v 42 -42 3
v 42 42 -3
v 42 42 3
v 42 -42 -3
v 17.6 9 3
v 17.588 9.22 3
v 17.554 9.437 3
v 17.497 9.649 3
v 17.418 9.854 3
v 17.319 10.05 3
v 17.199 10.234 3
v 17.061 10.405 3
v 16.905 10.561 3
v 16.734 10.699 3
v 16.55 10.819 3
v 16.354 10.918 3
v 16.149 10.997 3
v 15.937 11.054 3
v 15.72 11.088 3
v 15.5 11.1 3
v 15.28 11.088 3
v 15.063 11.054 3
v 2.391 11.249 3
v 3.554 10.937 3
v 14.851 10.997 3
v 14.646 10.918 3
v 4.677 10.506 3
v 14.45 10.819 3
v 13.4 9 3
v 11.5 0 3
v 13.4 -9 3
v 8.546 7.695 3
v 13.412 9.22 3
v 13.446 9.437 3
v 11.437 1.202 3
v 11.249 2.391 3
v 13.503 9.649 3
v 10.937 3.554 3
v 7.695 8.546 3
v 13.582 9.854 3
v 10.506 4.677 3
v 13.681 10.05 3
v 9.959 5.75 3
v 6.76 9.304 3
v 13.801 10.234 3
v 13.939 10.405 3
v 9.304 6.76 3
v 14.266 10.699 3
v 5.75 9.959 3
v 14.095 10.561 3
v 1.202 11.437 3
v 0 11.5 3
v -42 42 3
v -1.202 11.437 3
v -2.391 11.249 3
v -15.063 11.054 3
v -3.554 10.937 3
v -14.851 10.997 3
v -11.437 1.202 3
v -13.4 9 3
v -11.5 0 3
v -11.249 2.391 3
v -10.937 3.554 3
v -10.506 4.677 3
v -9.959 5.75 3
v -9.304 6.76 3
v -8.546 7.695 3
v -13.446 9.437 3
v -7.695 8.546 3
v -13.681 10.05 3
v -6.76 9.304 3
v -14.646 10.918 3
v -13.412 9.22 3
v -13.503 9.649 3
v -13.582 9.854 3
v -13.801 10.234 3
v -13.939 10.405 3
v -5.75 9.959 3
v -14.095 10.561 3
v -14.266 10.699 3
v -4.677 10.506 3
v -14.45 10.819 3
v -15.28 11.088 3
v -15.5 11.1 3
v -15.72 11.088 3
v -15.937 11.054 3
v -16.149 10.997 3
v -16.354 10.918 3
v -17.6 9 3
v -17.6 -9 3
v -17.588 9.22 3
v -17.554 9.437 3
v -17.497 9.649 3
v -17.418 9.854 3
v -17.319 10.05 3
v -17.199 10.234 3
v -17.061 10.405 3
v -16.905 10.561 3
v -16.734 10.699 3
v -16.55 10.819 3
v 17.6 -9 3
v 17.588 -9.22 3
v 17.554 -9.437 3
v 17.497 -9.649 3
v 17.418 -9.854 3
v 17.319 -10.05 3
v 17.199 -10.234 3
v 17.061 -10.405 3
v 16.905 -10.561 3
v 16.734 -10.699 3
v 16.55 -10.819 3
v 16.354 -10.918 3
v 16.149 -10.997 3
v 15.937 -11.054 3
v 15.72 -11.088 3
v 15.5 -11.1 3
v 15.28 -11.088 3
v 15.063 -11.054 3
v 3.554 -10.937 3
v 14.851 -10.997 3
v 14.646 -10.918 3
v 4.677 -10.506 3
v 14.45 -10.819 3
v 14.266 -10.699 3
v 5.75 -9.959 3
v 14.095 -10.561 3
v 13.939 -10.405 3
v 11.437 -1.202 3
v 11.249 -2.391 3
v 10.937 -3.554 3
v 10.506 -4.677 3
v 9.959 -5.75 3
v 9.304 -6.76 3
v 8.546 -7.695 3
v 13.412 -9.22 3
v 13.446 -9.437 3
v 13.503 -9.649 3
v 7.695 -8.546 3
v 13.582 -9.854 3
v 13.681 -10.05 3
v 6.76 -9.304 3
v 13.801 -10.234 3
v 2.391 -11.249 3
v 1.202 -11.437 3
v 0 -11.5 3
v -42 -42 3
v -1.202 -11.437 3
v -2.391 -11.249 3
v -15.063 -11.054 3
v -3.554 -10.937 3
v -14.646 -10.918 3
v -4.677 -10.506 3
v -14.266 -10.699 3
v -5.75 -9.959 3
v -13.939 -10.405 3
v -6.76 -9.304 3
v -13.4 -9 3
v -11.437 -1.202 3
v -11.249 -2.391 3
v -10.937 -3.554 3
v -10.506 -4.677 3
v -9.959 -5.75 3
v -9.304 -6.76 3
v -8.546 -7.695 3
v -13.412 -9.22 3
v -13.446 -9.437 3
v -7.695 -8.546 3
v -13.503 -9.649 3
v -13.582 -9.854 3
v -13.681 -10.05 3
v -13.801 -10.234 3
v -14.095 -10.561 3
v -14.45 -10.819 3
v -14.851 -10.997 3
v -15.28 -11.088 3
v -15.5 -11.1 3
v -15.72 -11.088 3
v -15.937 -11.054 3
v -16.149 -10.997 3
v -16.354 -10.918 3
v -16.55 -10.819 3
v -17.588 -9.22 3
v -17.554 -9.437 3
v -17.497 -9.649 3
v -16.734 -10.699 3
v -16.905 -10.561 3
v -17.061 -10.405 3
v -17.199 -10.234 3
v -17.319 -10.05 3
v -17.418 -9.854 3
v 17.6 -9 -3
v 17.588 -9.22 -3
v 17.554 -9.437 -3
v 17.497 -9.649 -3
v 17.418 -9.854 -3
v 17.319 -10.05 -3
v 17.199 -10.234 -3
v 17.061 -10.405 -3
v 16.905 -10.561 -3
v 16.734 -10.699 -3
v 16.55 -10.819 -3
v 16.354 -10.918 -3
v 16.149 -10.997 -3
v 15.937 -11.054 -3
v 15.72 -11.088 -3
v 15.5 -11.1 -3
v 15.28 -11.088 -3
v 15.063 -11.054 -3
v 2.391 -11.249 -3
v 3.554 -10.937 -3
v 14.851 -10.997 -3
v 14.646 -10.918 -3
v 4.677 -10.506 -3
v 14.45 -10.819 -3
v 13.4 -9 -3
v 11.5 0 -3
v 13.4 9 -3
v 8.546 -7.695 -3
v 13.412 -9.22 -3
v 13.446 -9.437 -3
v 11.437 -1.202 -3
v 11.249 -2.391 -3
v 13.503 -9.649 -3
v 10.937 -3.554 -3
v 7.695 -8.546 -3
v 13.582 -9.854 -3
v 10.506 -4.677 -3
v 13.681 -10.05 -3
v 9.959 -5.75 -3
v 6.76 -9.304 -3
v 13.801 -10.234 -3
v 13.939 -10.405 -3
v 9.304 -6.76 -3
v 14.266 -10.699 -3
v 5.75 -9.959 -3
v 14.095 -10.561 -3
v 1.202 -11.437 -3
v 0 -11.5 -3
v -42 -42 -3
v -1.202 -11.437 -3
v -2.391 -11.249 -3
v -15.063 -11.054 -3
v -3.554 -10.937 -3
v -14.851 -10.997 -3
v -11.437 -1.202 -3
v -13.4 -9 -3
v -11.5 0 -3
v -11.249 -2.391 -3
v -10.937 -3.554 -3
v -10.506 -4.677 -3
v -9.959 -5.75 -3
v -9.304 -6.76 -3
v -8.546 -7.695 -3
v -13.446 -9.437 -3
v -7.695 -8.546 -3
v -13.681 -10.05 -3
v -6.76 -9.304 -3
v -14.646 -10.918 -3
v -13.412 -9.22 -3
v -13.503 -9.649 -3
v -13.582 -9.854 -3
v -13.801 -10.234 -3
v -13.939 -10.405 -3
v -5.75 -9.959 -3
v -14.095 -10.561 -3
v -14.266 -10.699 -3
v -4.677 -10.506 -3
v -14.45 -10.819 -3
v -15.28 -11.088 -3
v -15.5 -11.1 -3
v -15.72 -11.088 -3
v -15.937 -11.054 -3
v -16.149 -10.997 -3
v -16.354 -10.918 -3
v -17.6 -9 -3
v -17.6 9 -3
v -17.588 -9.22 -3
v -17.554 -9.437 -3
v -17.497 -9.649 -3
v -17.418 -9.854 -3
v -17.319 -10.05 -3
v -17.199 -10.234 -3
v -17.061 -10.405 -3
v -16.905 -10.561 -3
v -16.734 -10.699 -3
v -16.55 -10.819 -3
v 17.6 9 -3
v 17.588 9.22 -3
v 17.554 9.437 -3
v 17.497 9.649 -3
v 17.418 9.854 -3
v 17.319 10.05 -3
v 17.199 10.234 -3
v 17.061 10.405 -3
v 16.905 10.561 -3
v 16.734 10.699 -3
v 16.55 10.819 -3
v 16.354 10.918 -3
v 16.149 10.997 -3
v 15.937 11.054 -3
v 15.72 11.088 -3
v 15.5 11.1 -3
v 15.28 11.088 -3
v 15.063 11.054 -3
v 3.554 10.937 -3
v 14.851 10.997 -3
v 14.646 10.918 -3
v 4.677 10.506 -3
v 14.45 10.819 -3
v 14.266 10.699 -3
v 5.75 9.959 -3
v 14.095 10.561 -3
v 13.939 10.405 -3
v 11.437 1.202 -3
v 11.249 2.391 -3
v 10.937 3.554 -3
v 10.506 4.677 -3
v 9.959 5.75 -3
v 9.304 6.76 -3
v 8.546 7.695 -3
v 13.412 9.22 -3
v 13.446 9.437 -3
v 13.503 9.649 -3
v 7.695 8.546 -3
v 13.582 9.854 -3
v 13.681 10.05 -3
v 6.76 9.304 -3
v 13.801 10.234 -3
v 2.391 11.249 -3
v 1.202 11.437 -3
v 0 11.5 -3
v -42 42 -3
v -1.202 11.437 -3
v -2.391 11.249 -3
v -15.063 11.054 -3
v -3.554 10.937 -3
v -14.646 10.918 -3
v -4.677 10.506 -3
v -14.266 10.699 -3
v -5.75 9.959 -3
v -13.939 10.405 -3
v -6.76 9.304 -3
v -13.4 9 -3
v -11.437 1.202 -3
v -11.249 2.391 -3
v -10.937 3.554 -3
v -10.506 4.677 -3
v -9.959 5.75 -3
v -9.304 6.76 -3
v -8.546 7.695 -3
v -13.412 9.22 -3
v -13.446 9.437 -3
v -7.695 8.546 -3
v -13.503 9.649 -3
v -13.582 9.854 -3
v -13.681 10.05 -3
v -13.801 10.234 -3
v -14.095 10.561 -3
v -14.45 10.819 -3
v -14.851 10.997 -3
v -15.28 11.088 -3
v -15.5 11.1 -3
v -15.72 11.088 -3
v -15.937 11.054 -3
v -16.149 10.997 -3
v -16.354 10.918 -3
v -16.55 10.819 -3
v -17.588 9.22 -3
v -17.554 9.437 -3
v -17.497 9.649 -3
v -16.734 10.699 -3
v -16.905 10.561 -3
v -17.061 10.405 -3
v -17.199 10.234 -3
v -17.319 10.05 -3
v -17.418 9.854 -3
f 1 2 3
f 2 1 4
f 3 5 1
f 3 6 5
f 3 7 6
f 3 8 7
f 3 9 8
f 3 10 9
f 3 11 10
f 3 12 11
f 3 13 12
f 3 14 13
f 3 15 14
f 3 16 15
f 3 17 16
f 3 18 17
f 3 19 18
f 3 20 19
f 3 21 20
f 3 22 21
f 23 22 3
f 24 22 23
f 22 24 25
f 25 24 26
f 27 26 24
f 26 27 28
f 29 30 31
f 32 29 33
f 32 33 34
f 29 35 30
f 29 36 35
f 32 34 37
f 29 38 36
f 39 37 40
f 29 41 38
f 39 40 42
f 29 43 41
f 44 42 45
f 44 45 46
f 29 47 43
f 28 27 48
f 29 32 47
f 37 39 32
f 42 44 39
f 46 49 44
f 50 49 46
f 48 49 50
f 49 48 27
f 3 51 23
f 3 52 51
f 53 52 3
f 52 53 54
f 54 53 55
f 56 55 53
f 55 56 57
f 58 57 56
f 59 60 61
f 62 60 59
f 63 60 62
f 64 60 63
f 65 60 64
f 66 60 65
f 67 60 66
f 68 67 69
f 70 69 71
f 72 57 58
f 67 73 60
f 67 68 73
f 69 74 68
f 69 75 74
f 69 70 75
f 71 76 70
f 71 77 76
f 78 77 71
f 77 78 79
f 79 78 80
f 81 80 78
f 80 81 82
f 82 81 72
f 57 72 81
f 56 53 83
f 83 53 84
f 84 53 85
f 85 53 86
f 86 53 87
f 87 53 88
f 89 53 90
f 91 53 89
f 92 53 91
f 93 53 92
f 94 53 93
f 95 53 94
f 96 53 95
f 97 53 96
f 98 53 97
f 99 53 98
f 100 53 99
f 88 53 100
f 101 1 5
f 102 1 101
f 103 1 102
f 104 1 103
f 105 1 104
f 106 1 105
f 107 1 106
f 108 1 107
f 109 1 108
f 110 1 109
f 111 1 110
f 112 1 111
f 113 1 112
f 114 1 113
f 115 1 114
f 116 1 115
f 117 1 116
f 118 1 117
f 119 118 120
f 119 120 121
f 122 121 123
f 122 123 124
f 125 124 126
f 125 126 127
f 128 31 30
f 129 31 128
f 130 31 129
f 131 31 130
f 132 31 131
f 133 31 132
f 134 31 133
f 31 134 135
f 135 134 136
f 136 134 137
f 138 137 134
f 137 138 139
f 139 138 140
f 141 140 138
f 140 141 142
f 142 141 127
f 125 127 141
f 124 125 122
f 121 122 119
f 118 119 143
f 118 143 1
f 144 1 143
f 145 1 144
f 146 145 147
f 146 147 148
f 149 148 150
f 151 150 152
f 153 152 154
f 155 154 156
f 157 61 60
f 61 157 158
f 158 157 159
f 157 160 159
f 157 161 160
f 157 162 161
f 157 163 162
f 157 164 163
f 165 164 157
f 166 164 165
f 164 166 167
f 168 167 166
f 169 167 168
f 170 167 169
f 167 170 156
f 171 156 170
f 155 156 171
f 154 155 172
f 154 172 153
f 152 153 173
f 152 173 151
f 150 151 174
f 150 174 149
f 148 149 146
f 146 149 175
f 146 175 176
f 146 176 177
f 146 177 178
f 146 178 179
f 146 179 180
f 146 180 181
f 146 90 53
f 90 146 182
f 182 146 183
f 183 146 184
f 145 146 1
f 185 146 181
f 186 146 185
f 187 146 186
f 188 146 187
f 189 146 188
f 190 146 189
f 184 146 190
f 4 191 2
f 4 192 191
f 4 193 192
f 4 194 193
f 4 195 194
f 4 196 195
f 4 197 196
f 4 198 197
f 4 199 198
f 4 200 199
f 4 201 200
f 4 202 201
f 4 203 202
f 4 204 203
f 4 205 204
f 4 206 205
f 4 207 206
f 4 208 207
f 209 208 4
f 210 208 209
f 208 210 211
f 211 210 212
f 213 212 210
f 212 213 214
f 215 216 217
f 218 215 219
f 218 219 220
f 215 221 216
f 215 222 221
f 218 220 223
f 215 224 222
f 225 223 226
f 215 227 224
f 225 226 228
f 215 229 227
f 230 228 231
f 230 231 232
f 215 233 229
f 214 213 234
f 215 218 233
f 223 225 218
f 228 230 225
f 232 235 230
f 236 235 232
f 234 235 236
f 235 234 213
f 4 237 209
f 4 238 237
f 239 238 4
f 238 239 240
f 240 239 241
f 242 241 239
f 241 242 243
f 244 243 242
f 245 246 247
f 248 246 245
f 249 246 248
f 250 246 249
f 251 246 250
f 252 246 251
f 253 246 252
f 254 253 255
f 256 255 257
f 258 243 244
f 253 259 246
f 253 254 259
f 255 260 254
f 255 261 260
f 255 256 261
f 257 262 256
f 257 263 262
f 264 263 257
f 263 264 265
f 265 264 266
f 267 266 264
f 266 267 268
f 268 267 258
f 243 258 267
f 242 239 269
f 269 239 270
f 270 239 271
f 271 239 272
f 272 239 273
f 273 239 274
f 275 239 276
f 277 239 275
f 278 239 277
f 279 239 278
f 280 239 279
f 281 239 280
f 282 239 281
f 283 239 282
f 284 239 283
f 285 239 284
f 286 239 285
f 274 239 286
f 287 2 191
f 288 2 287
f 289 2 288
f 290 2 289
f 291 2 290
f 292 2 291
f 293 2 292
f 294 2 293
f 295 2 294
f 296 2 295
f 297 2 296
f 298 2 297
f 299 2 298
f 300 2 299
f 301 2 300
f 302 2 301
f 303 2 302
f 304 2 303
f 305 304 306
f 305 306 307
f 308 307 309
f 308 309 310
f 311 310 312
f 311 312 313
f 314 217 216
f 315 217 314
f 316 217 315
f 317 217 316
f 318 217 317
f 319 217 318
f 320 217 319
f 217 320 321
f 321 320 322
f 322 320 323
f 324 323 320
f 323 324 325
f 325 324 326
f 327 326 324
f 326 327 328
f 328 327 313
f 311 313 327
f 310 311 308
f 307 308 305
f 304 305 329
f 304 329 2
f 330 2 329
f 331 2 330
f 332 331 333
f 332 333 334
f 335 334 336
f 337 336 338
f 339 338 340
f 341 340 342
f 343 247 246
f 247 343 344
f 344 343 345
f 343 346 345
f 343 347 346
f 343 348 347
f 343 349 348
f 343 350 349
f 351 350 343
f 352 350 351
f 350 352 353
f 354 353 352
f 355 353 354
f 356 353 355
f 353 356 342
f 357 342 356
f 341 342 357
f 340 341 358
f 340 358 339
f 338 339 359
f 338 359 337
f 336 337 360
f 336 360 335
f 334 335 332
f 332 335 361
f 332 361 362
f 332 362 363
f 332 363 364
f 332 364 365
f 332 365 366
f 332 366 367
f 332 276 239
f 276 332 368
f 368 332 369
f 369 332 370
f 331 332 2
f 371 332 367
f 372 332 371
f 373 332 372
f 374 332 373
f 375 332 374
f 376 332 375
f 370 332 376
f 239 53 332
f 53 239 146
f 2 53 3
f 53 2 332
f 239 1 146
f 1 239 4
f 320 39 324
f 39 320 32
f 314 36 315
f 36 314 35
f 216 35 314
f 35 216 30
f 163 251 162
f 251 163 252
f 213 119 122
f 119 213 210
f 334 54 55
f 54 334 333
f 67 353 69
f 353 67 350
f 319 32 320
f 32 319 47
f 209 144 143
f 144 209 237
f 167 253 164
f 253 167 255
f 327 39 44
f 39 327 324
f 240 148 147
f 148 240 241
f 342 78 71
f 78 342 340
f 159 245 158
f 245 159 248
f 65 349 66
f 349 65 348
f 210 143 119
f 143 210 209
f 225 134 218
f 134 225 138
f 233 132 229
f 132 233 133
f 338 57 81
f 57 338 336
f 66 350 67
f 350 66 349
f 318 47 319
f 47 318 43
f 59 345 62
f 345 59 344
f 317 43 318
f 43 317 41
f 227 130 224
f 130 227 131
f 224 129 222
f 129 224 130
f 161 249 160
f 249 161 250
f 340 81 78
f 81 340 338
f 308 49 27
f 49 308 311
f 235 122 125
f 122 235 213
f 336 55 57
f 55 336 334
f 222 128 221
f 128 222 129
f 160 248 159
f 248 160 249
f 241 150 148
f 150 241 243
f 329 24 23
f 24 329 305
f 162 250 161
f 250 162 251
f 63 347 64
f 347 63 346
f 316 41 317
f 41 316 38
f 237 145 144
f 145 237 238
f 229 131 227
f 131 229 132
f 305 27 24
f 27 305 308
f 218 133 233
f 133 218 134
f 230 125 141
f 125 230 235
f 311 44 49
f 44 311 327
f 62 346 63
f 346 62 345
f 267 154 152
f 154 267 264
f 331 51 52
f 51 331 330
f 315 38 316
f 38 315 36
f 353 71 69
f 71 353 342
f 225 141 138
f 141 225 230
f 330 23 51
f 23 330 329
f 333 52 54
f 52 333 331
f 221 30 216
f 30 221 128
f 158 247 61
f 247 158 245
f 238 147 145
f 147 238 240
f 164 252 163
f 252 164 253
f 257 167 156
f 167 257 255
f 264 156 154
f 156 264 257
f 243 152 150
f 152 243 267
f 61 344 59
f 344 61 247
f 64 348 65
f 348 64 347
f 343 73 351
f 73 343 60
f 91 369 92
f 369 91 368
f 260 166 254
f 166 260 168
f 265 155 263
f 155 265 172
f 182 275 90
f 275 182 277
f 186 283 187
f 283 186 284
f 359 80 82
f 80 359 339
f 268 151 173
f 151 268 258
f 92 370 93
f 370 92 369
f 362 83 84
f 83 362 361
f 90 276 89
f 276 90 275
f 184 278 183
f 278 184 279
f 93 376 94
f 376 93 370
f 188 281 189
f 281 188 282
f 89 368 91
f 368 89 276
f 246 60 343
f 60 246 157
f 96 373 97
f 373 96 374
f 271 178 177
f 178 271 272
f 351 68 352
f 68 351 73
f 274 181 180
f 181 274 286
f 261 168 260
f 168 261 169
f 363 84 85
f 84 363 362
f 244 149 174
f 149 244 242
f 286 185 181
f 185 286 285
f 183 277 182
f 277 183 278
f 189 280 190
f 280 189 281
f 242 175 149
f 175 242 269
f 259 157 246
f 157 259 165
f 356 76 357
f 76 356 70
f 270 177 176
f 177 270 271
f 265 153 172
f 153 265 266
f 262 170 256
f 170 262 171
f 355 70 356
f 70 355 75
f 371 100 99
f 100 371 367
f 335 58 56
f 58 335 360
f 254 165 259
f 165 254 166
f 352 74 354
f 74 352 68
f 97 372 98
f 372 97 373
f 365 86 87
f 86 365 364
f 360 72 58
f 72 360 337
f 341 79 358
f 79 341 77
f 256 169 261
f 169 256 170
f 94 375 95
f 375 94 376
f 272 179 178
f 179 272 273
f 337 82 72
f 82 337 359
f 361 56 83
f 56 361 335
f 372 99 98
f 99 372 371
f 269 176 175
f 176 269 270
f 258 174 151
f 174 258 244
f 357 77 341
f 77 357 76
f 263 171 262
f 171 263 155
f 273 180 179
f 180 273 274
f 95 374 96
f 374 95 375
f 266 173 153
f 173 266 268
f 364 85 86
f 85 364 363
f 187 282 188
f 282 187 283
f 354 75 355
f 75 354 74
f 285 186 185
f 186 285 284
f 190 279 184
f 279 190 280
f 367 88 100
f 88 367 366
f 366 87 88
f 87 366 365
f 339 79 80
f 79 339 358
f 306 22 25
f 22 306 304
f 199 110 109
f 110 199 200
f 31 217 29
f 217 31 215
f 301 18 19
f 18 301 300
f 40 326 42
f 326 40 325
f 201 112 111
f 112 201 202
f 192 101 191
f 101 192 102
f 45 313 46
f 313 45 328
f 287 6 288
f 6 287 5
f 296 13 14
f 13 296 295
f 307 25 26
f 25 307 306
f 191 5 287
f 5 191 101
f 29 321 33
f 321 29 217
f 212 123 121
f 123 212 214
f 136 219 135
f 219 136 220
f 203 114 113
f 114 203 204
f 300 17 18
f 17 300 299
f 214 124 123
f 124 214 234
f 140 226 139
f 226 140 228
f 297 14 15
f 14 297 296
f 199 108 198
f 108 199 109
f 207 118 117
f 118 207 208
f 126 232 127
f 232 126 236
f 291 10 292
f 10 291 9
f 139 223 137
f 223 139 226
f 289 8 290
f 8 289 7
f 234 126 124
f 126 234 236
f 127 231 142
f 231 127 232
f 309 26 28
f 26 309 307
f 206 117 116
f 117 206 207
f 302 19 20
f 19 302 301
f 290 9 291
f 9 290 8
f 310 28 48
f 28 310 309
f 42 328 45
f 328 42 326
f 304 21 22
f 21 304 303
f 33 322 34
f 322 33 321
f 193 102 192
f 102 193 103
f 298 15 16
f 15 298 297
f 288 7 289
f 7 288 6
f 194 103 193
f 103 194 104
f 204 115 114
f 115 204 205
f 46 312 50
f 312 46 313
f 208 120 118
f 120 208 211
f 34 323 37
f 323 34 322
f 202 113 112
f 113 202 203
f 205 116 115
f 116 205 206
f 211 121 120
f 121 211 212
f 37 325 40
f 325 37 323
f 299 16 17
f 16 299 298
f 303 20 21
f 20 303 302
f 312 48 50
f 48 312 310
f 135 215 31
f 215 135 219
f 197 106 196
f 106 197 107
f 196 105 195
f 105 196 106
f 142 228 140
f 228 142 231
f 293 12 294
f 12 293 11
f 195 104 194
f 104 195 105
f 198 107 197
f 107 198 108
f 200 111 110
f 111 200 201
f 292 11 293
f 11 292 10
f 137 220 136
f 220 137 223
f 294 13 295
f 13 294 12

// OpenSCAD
// NEMA 17 adjustable motor plate, 84 mm square.
$fn = 60;
eps = 0.02;
plate = 84;
plate_t = 6;
hole_pitch = 31;
center_d = 23;
slot_l = 18;
slot_d = 4.2;
module slot(x) {
    hull() {
        translate([x, -slot_l / 2, -plate_t / 2 - eps]) cylinder(d = slot_d, h = plate_t + 2 * eps);
        translate([x, slot_l / 2, -plate_t / 2 - eps]) cylinder(d = slot_d, h = plate_t + 2 * eps);
    }
}
difference() {
    cube([plate, plate, plate_t], center = true);
    translate([0, 0, -plate_t / 2 - eps]) cylinder(d = center_d, h = plate_t + 2 * eps);
    slot(-hole_pitch / 2);
    slot(hole_pitch / 2);
}
